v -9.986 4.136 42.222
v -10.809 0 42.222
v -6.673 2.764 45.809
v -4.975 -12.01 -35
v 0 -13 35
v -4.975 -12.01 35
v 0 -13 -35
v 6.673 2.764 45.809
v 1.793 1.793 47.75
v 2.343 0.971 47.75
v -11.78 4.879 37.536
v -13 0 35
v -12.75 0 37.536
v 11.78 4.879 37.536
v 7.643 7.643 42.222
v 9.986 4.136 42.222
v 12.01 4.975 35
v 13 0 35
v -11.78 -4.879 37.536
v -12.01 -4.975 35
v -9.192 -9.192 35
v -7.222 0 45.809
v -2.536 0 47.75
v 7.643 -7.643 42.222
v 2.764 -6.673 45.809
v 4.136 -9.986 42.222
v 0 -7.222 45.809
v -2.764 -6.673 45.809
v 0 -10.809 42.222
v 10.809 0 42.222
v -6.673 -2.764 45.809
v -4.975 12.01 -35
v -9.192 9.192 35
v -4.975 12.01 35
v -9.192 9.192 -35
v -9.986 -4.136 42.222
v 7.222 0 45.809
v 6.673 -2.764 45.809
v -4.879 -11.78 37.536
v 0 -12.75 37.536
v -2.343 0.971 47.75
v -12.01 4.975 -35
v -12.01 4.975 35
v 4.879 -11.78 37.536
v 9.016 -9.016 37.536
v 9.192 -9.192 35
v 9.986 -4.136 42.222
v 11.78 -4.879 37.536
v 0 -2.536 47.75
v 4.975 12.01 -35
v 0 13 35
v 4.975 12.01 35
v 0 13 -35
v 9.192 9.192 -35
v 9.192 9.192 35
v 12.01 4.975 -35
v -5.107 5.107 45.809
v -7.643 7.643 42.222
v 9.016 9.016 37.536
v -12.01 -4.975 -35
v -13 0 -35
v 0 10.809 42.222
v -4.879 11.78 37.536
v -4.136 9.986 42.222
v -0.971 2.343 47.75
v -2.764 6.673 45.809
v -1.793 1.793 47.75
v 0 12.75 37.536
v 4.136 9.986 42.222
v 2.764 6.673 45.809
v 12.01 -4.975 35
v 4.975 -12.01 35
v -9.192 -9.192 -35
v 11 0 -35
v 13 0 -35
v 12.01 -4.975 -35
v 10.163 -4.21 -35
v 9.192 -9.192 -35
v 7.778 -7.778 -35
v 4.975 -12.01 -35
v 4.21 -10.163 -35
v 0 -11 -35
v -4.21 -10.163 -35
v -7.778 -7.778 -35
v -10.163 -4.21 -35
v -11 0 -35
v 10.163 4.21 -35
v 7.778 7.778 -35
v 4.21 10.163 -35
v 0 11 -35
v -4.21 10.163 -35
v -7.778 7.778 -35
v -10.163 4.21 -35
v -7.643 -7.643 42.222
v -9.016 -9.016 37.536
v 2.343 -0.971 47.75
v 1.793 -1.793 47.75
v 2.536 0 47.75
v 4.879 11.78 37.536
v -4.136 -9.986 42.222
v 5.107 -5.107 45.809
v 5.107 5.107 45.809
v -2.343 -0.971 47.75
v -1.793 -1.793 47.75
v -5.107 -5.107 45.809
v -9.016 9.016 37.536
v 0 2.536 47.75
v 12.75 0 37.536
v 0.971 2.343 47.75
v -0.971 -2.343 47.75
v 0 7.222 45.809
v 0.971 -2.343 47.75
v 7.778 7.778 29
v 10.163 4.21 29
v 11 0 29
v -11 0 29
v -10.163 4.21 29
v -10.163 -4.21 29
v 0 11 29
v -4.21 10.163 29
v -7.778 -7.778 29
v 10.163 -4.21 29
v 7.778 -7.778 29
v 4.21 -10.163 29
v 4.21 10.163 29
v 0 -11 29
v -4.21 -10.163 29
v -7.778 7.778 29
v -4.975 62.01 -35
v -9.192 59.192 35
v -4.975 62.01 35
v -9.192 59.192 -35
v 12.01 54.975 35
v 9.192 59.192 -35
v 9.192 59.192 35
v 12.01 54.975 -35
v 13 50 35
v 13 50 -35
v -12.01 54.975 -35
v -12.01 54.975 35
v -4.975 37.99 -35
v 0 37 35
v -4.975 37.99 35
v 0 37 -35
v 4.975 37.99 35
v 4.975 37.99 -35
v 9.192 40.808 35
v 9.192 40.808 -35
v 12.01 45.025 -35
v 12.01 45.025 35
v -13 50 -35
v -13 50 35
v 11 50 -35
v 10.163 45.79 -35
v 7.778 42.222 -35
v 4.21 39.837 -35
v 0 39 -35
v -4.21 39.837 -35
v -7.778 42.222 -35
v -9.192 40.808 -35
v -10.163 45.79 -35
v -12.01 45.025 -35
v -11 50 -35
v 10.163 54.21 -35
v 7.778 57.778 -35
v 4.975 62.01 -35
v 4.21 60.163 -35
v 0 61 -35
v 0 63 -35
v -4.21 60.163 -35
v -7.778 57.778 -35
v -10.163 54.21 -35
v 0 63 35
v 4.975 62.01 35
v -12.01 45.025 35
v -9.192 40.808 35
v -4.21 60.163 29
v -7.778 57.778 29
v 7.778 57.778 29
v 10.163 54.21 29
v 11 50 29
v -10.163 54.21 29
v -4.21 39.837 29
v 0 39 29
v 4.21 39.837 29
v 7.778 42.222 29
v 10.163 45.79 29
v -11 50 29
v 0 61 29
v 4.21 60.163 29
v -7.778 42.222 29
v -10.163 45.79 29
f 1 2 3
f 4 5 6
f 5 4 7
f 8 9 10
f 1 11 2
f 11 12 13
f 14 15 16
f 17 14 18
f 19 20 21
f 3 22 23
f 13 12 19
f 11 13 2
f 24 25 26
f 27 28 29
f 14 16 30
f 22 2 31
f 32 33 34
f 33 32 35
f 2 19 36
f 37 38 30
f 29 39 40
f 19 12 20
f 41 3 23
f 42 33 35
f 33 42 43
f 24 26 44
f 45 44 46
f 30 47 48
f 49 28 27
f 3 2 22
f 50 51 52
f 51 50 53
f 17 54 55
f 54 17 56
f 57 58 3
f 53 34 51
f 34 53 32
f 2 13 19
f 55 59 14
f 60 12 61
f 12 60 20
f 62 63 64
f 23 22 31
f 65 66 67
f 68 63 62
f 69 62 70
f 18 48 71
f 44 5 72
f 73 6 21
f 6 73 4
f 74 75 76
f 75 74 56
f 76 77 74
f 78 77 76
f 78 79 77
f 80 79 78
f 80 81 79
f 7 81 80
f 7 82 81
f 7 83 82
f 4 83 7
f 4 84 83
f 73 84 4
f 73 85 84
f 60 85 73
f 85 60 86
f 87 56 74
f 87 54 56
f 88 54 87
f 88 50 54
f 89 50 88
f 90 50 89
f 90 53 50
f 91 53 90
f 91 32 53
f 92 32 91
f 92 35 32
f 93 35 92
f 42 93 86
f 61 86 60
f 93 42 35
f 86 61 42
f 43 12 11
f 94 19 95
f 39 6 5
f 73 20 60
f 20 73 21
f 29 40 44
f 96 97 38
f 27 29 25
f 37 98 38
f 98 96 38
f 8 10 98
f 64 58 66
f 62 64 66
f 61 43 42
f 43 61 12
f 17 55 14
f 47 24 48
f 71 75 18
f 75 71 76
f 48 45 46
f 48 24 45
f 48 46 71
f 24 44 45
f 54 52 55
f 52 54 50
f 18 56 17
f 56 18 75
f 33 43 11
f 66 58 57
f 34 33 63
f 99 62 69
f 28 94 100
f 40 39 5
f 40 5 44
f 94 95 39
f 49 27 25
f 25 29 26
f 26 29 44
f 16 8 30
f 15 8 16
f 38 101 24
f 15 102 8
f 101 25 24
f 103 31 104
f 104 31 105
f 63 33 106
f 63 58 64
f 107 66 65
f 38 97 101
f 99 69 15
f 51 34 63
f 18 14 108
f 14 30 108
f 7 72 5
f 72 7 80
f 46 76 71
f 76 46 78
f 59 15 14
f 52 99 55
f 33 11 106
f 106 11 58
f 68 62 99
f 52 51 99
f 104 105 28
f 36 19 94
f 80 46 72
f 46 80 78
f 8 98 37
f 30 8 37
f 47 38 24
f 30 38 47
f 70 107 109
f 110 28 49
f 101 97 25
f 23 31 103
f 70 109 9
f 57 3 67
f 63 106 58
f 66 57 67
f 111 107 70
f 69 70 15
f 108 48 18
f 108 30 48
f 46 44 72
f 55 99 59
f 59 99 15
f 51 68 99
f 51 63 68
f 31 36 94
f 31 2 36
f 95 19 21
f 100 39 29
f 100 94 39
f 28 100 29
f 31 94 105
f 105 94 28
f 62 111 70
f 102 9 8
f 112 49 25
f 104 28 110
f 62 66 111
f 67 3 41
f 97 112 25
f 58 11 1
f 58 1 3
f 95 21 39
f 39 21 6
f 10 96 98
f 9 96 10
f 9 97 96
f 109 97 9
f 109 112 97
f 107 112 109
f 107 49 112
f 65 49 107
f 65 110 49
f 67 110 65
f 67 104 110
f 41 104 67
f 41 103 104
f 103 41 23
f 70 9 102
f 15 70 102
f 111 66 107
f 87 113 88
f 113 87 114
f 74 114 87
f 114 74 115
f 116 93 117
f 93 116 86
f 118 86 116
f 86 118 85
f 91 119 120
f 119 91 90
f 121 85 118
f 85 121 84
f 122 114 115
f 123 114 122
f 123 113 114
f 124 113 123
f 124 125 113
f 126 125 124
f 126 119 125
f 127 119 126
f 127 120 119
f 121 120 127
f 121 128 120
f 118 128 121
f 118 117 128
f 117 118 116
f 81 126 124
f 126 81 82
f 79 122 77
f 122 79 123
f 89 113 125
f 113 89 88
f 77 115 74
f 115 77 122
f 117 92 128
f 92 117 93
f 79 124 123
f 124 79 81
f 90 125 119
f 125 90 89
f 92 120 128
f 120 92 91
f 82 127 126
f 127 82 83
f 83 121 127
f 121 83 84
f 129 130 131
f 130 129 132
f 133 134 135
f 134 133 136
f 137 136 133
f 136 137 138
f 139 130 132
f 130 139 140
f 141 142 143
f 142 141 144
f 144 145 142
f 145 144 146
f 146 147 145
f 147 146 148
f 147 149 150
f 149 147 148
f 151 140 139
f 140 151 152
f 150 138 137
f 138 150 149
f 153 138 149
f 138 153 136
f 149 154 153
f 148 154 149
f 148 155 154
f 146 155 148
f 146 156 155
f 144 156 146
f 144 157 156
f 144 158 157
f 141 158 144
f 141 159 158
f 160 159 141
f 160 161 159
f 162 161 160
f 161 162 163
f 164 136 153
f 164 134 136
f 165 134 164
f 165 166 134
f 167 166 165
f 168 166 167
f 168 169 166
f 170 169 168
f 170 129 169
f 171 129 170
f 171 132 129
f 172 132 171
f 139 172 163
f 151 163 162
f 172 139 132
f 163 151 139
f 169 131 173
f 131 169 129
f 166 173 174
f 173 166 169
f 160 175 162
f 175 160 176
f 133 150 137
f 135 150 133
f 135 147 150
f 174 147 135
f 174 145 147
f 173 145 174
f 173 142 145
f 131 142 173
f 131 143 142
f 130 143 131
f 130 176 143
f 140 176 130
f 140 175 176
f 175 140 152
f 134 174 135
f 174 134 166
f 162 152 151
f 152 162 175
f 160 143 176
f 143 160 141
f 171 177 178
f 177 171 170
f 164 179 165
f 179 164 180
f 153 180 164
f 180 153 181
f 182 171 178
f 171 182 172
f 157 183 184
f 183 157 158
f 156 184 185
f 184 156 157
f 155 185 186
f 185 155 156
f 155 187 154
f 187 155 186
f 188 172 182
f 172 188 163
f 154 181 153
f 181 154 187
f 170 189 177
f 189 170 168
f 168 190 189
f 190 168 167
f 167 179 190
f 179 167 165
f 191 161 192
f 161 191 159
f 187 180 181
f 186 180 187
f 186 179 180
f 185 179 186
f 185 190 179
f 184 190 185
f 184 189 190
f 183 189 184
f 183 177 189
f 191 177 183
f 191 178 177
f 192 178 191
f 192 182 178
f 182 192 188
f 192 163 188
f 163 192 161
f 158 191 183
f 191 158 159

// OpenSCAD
 poly_n = 16;
 diametro = 22;
 radio= diametro/2;
 grosor= 4;
 altura =70;
 
 
 //color("#aa0000")cylinder(h = altura, d=diametro, center = true, $fn=poly_n);
 // translate([0, 10, 0.0])
 difference(){
    hull(){
    translate([0, 0, altura/2])//punta centrada
    sphere( d=diametro+grosor, $fn=poly_n);
    cylinder(h = altura, d=diametro+grosor, center = true, $fn=poly_n);
     }
    translate([0, 0, -grosor])
    cylinder(h = altura-grosor, d=diametro, center = true, $fn=poly_n);
 }

translate([0, 50,0])
  difference(){
    cylinder(h = altura, d=diametro+grosor, center = true, $fn=poly_n);
    translate([0, 0, -grosor])
    cylinder(h = altura-grosor, d=diametro, center = true, $fn=poly_n);
 }
   
